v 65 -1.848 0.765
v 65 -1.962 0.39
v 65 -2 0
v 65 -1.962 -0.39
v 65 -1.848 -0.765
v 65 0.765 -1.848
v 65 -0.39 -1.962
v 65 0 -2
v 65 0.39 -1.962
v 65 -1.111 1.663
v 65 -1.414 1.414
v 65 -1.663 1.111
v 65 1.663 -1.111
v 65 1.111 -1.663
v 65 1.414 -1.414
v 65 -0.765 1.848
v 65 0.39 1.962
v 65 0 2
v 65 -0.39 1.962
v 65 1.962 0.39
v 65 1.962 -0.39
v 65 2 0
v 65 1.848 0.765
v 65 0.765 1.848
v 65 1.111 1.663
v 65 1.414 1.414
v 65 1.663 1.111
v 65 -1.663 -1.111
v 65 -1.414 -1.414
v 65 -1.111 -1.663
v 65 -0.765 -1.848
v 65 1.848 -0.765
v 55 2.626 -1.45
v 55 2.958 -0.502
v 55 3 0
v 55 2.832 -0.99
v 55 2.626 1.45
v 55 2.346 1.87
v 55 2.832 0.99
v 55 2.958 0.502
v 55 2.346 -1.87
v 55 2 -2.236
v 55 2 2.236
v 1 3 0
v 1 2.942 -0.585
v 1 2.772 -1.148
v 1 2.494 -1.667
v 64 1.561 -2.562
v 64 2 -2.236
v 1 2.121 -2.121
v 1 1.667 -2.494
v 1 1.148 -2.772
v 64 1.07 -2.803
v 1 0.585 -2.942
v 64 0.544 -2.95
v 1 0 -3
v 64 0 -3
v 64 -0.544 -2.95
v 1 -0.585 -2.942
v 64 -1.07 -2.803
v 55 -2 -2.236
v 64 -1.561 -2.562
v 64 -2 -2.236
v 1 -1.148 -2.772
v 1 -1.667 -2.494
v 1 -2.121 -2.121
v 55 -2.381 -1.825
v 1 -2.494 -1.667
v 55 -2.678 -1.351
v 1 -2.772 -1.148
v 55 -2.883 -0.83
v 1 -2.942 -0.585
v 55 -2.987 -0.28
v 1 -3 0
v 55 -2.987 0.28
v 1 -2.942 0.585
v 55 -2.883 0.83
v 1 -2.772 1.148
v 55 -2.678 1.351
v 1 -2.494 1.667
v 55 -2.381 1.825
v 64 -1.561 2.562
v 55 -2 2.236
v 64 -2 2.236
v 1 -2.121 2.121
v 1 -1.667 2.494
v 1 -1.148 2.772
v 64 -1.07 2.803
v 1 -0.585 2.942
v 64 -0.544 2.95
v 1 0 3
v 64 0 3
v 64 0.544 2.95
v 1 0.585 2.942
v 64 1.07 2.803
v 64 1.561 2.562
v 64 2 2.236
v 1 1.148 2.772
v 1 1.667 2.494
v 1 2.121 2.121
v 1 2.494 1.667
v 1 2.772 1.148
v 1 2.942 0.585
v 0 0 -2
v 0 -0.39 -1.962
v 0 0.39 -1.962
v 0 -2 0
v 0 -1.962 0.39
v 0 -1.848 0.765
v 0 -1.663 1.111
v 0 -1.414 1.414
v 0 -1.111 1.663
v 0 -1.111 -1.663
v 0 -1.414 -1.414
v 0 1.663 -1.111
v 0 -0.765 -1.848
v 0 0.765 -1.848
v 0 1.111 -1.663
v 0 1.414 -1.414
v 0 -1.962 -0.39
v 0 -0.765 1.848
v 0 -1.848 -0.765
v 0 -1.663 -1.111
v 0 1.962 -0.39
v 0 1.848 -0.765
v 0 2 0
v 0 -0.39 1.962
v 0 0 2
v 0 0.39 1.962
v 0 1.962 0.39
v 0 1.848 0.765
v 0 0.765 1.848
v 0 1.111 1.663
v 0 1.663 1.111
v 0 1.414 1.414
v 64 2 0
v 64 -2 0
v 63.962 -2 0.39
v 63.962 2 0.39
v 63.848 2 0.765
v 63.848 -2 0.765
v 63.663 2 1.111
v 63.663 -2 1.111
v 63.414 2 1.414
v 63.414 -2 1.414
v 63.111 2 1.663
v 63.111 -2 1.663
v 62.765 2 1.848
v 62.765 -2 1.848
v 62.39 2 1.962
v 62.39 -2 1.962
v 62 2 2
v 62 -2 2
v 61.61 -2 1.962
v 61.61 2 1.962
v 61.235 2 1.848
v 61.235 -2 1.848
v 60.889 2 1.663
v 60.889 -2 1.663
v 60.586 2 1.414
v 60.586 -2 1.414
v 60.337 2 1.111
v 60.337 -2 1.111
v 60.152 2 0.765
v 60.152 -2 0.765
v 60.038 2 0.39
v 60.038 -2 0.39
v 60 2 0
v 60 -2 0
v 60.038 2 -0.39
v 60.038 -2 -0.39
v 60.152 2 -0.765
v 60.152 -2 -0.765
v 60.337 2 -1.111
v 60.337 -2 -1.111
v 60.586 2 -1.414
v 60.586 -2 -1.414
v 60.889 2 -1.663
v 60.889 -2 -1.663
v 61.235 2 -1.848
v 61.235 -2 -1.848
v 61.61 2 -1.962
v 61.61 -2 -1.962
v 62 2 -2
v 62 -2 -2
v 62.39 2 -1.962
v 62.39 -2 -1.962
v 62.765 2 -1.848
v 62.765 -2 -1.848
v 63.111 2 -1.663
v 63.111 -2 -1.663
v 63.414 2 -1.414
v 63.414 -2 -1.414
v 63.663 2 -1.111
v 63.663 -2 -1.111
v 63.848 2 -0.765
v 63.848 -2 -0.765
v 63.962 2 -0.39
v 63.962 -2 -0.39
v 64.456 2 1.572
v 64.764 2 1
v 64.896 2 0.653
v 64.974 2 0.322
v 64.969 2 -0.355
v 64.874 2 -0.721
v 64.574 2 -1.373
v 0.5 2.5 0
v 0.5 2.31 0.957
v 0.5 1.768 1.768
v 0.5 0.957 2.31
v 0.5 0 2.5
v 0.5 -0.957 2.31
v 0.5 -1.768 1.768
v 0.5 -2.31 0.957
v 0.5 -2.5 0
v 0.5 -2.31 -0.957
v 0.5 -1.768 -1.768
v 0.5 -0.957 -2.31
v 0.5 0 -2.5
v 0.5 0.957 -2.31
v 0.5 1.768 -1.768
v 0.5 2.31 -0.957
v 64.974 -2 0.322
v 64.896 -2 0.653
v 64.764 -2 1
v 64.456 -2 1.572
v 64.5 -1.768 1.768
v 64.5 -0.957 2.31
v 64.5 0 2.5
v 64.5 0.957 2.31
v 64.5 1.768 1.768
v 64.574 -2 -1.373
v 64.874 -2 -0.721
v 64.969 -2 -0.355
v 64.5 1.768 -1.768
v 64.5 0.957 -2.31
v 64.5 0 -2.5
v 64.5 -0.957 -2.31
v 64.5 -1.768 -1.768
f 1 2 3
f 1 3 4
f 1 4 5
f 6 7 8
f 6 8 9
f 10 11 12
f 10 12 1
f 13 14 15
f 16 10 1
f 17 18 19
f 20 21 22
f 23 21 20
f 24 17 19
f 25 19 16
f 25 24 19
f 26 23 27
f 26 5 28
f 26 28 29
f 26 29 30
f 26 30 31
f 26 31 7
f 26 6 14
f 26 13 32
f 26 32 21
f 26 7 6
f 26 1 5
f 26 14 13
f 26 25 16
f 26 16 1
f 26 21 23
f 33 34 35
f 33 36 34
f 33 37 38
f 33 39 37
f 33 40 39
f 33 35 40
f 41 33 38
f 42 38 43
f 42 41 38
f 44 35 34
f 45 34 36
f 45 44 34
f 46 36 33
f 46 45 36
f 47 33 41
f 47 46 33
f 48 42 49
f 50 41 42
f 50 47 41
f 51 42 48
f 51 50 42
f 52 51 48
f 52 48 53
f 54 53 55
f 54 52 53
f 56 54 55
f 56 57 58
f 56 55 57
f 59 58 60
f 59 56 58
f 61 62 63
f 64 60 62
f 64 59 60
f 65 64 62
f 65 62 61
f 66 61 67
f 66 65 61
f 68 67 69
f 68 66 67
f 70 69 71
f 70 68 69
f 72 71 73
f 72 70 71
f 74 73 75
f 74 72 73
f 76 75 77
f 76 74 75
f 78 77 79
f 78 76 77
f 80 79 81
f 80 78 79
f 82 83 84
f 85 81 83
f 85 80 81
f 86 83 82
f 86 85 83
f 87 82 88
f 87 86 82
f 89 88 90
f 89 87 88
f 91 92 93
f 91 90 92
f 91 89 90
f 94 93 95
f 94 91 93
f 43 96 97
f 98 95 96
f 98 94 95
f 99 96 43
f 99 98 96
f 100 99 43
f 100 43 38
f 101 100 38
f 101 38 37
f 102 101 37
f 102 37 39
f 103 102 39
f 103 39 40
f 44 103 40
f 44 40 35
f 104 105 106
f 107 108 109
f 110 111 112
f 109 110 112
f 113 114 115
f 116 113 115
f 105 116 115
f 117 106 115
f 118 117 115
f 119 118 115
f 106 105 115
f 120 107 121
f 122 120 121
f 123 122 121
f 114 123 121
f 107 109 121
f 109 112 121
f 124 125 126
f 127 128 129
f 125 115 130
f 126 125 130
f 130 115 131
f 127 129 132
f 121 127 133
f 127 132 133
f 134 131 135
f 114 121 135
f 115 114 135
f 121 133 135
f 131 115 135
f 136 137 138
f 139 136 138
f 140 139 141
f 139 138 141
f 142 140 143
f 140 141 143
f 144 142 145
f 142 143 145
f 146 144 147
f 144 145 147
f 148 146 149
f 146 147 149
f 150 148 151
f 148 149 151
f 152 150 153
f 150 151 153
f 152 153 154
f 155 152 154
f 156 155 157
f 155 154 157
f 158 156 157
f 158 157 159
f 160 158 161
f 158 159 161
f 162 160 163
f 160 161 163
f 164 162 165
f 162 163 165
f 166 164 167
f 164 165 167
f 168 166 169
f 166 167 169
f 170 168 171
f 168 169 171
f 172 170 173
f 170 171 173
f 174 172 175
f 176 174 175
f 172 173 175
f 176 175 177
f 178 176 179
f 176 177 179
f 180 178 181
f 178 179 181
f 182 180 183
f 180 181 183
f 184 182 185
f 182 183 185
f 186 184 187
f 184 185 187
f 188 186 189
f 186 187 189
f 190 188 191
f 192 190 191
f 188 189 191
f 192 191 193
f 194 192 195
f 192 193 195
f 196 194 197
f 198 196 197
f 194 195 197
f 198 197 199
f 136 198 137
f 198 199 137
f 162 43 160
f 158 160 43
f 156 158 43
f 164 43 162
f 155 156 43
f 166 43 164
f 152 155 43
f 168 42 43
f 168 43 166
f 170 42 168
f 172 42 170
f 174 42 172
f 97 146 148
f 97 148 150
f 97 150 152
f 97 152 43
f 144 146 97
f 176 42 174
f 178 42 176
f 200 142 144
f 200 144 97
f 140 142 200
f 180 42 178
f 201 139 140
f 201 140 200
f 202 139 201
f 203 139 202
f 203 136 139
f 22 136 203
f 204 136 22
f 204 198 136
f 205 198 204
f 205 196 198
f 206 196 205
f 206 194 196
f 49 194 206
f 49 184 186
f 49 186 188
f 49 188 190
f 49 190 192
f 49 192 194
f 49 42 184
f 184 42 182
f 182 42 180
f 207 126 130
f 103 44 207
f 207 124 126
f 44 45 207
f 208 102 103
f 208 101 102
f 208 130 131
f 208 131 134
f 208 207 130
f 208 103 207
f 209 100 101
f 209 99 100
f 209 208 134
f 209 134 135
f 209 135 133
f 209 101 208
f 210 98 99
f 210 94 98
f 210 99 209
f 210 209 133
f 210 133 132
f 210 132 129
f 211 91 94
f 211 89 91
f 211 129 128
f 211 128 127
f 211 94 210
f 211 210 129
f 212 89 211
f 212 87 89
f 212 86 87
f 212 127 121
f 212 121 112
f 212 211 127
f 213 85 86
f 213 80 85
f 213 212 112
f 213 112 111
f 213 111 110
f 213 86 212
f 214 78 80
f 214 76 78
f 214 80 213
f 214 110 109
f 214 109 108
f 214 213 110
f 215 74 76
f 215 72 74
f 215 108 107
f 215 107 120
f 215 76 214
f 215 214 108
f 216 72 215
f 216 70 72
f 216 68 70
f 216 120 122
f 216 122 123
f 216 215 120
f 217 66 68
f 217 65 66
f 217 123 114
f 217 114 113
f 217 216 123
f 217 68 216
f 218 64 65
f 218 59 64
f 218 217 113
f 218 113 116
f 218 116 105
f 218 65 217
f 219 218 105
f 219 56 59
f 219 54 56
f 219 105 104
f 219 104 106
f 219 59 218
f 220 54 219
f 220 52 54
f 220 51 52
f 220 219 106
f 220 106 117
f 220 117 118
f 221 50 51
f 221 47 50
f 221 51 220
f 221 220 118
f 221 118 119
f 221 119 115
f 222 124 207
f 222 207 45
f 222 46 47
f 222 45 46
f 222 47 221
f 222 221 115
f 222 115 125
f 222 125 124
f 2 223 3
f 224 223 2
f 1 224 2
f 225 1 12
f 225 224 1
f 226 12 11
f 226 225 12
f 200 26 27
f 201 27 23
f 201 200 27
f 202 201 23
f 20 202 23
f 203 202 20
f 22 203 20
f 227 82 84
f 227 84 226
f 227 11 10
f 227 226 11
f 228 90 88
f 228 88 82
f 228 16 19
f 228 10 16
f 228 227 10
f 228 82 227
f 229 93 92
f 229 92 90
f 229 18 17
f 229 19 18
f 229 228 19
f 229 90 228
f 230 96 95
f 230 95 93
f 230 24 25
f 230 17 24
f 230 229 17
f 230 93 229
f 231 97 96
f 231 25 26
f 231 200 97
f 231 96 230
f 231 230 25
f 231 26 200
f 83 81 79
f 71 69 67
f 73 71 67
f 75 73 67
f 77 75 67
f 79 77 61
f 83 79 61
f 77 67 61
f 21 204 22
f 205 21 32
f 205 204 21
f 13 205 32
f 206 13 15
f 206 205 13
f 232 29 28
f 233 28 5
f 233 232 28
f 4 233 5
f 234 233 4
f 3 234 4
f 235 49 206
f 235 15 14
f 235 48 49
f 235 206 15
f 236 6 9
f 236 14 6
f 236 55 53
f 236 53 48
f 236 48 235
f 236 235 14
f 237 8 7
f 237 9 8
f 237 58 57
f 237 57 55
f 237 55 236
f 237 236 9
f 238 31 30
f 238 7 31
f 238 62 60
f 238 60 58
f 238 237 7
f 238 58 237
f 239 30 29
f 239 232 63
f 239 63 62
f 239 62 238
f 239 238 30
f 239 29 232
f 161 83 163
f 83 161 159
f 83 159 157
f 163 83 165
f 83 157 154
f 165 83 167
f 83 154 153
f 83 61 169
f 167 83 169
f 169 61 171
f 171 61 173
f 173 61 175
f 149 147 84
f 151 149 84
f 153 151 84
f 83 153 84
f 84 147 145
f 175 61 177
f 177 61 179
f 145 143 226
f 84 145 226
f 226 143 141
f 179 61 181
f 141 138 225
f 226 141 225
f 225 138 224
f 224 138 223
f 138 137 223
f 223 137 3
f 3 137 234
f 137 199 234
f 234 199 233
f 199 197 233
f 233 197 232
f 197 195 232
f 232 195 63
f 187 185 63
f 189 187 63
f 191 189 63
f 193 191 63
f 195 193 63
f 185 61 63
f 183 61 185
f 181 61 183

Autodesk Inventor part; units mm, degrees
ref_plane "YZ Plane" through (0, 0, 0) normal (1, 0, 0) x (0, 1, 0)
ref_plane "XZ Plane" through (0, 0, 0) normal (0, 1, 0) x (-1, 0, 0)
ref_plane "XY Plane" through (0, 0, 0) normal (0, 0, 1) x (1, 0, 0)
sketch "Sketch1" plane through (0, 0, 0) normal (0, 0, 1) x (1, 0, 0)
  line L0 (0, 0) -> (65, 0)
  line L1 (65, 0) -> (65, 3)
  line L2 (65, 3) -> (0, 3)
  line L3 (0, 3) -> (0, 0)
  dimension "d0" = 65
  dimension "d1" = 6
revolve "Revolution1" add sketch "Sketch1" angle 360 about axis through (0, 0, 0) along (1, 0, 0)
thread "Thread1" size "M6x1" class "6g" standard "ANSI Metric M Profile" length 15
chamfer "Chamfer1" distance 1 angle 45 2 edges at (0, -3, 0) (65, -3, 0)
sketch "Sketch2" plane through (0, 0, 0) normal (0, 0, 1) x (1, 0, 0)
  line L0 (1, 3) -> (64, 3) projected
  line L1 (65, 3) -> (55, 3)
  line L2 (55, 3) -> (55, 2)
  line L3 (55, 2) -> (65, 2)
  line L4 (65, 2) -> (65, 3)
  line L5 (65, -3) -> (65, 3) projected
  line L6 (65, -3) -> (55, -3)
  line L7 (55, -3) -> (55, -2)
  line L8 (55, -2) -> (65, -2)
  line L9 (65, -2) -> (65, -3)
  point P0 (0, 0)
  point P1 (55, 3)
  dimension "d8" = 4
  dimension "d15" = 10
extrude "Extrusion1" cut sketch "Sketch2" along normal through all both and the other way through all
sketch "Sketch3" plane through (55, -2, -2.2361) normal (0, -1, 0) x (1, 0, 0)
  circle A0 centre (7, 2.2361) radius 2
  line L0 (10, 2.2361) -> (10, 0.2361) projected
  point P0 (-55, 2.2361)
  dimension "d11" = 4
  dimension "d14" = 3
extrude "Extrusion2" cut sketch "Sketch3" against normal through all
properties part number "M6x1_THREADED_ROD" material "Steel, Carbon"
